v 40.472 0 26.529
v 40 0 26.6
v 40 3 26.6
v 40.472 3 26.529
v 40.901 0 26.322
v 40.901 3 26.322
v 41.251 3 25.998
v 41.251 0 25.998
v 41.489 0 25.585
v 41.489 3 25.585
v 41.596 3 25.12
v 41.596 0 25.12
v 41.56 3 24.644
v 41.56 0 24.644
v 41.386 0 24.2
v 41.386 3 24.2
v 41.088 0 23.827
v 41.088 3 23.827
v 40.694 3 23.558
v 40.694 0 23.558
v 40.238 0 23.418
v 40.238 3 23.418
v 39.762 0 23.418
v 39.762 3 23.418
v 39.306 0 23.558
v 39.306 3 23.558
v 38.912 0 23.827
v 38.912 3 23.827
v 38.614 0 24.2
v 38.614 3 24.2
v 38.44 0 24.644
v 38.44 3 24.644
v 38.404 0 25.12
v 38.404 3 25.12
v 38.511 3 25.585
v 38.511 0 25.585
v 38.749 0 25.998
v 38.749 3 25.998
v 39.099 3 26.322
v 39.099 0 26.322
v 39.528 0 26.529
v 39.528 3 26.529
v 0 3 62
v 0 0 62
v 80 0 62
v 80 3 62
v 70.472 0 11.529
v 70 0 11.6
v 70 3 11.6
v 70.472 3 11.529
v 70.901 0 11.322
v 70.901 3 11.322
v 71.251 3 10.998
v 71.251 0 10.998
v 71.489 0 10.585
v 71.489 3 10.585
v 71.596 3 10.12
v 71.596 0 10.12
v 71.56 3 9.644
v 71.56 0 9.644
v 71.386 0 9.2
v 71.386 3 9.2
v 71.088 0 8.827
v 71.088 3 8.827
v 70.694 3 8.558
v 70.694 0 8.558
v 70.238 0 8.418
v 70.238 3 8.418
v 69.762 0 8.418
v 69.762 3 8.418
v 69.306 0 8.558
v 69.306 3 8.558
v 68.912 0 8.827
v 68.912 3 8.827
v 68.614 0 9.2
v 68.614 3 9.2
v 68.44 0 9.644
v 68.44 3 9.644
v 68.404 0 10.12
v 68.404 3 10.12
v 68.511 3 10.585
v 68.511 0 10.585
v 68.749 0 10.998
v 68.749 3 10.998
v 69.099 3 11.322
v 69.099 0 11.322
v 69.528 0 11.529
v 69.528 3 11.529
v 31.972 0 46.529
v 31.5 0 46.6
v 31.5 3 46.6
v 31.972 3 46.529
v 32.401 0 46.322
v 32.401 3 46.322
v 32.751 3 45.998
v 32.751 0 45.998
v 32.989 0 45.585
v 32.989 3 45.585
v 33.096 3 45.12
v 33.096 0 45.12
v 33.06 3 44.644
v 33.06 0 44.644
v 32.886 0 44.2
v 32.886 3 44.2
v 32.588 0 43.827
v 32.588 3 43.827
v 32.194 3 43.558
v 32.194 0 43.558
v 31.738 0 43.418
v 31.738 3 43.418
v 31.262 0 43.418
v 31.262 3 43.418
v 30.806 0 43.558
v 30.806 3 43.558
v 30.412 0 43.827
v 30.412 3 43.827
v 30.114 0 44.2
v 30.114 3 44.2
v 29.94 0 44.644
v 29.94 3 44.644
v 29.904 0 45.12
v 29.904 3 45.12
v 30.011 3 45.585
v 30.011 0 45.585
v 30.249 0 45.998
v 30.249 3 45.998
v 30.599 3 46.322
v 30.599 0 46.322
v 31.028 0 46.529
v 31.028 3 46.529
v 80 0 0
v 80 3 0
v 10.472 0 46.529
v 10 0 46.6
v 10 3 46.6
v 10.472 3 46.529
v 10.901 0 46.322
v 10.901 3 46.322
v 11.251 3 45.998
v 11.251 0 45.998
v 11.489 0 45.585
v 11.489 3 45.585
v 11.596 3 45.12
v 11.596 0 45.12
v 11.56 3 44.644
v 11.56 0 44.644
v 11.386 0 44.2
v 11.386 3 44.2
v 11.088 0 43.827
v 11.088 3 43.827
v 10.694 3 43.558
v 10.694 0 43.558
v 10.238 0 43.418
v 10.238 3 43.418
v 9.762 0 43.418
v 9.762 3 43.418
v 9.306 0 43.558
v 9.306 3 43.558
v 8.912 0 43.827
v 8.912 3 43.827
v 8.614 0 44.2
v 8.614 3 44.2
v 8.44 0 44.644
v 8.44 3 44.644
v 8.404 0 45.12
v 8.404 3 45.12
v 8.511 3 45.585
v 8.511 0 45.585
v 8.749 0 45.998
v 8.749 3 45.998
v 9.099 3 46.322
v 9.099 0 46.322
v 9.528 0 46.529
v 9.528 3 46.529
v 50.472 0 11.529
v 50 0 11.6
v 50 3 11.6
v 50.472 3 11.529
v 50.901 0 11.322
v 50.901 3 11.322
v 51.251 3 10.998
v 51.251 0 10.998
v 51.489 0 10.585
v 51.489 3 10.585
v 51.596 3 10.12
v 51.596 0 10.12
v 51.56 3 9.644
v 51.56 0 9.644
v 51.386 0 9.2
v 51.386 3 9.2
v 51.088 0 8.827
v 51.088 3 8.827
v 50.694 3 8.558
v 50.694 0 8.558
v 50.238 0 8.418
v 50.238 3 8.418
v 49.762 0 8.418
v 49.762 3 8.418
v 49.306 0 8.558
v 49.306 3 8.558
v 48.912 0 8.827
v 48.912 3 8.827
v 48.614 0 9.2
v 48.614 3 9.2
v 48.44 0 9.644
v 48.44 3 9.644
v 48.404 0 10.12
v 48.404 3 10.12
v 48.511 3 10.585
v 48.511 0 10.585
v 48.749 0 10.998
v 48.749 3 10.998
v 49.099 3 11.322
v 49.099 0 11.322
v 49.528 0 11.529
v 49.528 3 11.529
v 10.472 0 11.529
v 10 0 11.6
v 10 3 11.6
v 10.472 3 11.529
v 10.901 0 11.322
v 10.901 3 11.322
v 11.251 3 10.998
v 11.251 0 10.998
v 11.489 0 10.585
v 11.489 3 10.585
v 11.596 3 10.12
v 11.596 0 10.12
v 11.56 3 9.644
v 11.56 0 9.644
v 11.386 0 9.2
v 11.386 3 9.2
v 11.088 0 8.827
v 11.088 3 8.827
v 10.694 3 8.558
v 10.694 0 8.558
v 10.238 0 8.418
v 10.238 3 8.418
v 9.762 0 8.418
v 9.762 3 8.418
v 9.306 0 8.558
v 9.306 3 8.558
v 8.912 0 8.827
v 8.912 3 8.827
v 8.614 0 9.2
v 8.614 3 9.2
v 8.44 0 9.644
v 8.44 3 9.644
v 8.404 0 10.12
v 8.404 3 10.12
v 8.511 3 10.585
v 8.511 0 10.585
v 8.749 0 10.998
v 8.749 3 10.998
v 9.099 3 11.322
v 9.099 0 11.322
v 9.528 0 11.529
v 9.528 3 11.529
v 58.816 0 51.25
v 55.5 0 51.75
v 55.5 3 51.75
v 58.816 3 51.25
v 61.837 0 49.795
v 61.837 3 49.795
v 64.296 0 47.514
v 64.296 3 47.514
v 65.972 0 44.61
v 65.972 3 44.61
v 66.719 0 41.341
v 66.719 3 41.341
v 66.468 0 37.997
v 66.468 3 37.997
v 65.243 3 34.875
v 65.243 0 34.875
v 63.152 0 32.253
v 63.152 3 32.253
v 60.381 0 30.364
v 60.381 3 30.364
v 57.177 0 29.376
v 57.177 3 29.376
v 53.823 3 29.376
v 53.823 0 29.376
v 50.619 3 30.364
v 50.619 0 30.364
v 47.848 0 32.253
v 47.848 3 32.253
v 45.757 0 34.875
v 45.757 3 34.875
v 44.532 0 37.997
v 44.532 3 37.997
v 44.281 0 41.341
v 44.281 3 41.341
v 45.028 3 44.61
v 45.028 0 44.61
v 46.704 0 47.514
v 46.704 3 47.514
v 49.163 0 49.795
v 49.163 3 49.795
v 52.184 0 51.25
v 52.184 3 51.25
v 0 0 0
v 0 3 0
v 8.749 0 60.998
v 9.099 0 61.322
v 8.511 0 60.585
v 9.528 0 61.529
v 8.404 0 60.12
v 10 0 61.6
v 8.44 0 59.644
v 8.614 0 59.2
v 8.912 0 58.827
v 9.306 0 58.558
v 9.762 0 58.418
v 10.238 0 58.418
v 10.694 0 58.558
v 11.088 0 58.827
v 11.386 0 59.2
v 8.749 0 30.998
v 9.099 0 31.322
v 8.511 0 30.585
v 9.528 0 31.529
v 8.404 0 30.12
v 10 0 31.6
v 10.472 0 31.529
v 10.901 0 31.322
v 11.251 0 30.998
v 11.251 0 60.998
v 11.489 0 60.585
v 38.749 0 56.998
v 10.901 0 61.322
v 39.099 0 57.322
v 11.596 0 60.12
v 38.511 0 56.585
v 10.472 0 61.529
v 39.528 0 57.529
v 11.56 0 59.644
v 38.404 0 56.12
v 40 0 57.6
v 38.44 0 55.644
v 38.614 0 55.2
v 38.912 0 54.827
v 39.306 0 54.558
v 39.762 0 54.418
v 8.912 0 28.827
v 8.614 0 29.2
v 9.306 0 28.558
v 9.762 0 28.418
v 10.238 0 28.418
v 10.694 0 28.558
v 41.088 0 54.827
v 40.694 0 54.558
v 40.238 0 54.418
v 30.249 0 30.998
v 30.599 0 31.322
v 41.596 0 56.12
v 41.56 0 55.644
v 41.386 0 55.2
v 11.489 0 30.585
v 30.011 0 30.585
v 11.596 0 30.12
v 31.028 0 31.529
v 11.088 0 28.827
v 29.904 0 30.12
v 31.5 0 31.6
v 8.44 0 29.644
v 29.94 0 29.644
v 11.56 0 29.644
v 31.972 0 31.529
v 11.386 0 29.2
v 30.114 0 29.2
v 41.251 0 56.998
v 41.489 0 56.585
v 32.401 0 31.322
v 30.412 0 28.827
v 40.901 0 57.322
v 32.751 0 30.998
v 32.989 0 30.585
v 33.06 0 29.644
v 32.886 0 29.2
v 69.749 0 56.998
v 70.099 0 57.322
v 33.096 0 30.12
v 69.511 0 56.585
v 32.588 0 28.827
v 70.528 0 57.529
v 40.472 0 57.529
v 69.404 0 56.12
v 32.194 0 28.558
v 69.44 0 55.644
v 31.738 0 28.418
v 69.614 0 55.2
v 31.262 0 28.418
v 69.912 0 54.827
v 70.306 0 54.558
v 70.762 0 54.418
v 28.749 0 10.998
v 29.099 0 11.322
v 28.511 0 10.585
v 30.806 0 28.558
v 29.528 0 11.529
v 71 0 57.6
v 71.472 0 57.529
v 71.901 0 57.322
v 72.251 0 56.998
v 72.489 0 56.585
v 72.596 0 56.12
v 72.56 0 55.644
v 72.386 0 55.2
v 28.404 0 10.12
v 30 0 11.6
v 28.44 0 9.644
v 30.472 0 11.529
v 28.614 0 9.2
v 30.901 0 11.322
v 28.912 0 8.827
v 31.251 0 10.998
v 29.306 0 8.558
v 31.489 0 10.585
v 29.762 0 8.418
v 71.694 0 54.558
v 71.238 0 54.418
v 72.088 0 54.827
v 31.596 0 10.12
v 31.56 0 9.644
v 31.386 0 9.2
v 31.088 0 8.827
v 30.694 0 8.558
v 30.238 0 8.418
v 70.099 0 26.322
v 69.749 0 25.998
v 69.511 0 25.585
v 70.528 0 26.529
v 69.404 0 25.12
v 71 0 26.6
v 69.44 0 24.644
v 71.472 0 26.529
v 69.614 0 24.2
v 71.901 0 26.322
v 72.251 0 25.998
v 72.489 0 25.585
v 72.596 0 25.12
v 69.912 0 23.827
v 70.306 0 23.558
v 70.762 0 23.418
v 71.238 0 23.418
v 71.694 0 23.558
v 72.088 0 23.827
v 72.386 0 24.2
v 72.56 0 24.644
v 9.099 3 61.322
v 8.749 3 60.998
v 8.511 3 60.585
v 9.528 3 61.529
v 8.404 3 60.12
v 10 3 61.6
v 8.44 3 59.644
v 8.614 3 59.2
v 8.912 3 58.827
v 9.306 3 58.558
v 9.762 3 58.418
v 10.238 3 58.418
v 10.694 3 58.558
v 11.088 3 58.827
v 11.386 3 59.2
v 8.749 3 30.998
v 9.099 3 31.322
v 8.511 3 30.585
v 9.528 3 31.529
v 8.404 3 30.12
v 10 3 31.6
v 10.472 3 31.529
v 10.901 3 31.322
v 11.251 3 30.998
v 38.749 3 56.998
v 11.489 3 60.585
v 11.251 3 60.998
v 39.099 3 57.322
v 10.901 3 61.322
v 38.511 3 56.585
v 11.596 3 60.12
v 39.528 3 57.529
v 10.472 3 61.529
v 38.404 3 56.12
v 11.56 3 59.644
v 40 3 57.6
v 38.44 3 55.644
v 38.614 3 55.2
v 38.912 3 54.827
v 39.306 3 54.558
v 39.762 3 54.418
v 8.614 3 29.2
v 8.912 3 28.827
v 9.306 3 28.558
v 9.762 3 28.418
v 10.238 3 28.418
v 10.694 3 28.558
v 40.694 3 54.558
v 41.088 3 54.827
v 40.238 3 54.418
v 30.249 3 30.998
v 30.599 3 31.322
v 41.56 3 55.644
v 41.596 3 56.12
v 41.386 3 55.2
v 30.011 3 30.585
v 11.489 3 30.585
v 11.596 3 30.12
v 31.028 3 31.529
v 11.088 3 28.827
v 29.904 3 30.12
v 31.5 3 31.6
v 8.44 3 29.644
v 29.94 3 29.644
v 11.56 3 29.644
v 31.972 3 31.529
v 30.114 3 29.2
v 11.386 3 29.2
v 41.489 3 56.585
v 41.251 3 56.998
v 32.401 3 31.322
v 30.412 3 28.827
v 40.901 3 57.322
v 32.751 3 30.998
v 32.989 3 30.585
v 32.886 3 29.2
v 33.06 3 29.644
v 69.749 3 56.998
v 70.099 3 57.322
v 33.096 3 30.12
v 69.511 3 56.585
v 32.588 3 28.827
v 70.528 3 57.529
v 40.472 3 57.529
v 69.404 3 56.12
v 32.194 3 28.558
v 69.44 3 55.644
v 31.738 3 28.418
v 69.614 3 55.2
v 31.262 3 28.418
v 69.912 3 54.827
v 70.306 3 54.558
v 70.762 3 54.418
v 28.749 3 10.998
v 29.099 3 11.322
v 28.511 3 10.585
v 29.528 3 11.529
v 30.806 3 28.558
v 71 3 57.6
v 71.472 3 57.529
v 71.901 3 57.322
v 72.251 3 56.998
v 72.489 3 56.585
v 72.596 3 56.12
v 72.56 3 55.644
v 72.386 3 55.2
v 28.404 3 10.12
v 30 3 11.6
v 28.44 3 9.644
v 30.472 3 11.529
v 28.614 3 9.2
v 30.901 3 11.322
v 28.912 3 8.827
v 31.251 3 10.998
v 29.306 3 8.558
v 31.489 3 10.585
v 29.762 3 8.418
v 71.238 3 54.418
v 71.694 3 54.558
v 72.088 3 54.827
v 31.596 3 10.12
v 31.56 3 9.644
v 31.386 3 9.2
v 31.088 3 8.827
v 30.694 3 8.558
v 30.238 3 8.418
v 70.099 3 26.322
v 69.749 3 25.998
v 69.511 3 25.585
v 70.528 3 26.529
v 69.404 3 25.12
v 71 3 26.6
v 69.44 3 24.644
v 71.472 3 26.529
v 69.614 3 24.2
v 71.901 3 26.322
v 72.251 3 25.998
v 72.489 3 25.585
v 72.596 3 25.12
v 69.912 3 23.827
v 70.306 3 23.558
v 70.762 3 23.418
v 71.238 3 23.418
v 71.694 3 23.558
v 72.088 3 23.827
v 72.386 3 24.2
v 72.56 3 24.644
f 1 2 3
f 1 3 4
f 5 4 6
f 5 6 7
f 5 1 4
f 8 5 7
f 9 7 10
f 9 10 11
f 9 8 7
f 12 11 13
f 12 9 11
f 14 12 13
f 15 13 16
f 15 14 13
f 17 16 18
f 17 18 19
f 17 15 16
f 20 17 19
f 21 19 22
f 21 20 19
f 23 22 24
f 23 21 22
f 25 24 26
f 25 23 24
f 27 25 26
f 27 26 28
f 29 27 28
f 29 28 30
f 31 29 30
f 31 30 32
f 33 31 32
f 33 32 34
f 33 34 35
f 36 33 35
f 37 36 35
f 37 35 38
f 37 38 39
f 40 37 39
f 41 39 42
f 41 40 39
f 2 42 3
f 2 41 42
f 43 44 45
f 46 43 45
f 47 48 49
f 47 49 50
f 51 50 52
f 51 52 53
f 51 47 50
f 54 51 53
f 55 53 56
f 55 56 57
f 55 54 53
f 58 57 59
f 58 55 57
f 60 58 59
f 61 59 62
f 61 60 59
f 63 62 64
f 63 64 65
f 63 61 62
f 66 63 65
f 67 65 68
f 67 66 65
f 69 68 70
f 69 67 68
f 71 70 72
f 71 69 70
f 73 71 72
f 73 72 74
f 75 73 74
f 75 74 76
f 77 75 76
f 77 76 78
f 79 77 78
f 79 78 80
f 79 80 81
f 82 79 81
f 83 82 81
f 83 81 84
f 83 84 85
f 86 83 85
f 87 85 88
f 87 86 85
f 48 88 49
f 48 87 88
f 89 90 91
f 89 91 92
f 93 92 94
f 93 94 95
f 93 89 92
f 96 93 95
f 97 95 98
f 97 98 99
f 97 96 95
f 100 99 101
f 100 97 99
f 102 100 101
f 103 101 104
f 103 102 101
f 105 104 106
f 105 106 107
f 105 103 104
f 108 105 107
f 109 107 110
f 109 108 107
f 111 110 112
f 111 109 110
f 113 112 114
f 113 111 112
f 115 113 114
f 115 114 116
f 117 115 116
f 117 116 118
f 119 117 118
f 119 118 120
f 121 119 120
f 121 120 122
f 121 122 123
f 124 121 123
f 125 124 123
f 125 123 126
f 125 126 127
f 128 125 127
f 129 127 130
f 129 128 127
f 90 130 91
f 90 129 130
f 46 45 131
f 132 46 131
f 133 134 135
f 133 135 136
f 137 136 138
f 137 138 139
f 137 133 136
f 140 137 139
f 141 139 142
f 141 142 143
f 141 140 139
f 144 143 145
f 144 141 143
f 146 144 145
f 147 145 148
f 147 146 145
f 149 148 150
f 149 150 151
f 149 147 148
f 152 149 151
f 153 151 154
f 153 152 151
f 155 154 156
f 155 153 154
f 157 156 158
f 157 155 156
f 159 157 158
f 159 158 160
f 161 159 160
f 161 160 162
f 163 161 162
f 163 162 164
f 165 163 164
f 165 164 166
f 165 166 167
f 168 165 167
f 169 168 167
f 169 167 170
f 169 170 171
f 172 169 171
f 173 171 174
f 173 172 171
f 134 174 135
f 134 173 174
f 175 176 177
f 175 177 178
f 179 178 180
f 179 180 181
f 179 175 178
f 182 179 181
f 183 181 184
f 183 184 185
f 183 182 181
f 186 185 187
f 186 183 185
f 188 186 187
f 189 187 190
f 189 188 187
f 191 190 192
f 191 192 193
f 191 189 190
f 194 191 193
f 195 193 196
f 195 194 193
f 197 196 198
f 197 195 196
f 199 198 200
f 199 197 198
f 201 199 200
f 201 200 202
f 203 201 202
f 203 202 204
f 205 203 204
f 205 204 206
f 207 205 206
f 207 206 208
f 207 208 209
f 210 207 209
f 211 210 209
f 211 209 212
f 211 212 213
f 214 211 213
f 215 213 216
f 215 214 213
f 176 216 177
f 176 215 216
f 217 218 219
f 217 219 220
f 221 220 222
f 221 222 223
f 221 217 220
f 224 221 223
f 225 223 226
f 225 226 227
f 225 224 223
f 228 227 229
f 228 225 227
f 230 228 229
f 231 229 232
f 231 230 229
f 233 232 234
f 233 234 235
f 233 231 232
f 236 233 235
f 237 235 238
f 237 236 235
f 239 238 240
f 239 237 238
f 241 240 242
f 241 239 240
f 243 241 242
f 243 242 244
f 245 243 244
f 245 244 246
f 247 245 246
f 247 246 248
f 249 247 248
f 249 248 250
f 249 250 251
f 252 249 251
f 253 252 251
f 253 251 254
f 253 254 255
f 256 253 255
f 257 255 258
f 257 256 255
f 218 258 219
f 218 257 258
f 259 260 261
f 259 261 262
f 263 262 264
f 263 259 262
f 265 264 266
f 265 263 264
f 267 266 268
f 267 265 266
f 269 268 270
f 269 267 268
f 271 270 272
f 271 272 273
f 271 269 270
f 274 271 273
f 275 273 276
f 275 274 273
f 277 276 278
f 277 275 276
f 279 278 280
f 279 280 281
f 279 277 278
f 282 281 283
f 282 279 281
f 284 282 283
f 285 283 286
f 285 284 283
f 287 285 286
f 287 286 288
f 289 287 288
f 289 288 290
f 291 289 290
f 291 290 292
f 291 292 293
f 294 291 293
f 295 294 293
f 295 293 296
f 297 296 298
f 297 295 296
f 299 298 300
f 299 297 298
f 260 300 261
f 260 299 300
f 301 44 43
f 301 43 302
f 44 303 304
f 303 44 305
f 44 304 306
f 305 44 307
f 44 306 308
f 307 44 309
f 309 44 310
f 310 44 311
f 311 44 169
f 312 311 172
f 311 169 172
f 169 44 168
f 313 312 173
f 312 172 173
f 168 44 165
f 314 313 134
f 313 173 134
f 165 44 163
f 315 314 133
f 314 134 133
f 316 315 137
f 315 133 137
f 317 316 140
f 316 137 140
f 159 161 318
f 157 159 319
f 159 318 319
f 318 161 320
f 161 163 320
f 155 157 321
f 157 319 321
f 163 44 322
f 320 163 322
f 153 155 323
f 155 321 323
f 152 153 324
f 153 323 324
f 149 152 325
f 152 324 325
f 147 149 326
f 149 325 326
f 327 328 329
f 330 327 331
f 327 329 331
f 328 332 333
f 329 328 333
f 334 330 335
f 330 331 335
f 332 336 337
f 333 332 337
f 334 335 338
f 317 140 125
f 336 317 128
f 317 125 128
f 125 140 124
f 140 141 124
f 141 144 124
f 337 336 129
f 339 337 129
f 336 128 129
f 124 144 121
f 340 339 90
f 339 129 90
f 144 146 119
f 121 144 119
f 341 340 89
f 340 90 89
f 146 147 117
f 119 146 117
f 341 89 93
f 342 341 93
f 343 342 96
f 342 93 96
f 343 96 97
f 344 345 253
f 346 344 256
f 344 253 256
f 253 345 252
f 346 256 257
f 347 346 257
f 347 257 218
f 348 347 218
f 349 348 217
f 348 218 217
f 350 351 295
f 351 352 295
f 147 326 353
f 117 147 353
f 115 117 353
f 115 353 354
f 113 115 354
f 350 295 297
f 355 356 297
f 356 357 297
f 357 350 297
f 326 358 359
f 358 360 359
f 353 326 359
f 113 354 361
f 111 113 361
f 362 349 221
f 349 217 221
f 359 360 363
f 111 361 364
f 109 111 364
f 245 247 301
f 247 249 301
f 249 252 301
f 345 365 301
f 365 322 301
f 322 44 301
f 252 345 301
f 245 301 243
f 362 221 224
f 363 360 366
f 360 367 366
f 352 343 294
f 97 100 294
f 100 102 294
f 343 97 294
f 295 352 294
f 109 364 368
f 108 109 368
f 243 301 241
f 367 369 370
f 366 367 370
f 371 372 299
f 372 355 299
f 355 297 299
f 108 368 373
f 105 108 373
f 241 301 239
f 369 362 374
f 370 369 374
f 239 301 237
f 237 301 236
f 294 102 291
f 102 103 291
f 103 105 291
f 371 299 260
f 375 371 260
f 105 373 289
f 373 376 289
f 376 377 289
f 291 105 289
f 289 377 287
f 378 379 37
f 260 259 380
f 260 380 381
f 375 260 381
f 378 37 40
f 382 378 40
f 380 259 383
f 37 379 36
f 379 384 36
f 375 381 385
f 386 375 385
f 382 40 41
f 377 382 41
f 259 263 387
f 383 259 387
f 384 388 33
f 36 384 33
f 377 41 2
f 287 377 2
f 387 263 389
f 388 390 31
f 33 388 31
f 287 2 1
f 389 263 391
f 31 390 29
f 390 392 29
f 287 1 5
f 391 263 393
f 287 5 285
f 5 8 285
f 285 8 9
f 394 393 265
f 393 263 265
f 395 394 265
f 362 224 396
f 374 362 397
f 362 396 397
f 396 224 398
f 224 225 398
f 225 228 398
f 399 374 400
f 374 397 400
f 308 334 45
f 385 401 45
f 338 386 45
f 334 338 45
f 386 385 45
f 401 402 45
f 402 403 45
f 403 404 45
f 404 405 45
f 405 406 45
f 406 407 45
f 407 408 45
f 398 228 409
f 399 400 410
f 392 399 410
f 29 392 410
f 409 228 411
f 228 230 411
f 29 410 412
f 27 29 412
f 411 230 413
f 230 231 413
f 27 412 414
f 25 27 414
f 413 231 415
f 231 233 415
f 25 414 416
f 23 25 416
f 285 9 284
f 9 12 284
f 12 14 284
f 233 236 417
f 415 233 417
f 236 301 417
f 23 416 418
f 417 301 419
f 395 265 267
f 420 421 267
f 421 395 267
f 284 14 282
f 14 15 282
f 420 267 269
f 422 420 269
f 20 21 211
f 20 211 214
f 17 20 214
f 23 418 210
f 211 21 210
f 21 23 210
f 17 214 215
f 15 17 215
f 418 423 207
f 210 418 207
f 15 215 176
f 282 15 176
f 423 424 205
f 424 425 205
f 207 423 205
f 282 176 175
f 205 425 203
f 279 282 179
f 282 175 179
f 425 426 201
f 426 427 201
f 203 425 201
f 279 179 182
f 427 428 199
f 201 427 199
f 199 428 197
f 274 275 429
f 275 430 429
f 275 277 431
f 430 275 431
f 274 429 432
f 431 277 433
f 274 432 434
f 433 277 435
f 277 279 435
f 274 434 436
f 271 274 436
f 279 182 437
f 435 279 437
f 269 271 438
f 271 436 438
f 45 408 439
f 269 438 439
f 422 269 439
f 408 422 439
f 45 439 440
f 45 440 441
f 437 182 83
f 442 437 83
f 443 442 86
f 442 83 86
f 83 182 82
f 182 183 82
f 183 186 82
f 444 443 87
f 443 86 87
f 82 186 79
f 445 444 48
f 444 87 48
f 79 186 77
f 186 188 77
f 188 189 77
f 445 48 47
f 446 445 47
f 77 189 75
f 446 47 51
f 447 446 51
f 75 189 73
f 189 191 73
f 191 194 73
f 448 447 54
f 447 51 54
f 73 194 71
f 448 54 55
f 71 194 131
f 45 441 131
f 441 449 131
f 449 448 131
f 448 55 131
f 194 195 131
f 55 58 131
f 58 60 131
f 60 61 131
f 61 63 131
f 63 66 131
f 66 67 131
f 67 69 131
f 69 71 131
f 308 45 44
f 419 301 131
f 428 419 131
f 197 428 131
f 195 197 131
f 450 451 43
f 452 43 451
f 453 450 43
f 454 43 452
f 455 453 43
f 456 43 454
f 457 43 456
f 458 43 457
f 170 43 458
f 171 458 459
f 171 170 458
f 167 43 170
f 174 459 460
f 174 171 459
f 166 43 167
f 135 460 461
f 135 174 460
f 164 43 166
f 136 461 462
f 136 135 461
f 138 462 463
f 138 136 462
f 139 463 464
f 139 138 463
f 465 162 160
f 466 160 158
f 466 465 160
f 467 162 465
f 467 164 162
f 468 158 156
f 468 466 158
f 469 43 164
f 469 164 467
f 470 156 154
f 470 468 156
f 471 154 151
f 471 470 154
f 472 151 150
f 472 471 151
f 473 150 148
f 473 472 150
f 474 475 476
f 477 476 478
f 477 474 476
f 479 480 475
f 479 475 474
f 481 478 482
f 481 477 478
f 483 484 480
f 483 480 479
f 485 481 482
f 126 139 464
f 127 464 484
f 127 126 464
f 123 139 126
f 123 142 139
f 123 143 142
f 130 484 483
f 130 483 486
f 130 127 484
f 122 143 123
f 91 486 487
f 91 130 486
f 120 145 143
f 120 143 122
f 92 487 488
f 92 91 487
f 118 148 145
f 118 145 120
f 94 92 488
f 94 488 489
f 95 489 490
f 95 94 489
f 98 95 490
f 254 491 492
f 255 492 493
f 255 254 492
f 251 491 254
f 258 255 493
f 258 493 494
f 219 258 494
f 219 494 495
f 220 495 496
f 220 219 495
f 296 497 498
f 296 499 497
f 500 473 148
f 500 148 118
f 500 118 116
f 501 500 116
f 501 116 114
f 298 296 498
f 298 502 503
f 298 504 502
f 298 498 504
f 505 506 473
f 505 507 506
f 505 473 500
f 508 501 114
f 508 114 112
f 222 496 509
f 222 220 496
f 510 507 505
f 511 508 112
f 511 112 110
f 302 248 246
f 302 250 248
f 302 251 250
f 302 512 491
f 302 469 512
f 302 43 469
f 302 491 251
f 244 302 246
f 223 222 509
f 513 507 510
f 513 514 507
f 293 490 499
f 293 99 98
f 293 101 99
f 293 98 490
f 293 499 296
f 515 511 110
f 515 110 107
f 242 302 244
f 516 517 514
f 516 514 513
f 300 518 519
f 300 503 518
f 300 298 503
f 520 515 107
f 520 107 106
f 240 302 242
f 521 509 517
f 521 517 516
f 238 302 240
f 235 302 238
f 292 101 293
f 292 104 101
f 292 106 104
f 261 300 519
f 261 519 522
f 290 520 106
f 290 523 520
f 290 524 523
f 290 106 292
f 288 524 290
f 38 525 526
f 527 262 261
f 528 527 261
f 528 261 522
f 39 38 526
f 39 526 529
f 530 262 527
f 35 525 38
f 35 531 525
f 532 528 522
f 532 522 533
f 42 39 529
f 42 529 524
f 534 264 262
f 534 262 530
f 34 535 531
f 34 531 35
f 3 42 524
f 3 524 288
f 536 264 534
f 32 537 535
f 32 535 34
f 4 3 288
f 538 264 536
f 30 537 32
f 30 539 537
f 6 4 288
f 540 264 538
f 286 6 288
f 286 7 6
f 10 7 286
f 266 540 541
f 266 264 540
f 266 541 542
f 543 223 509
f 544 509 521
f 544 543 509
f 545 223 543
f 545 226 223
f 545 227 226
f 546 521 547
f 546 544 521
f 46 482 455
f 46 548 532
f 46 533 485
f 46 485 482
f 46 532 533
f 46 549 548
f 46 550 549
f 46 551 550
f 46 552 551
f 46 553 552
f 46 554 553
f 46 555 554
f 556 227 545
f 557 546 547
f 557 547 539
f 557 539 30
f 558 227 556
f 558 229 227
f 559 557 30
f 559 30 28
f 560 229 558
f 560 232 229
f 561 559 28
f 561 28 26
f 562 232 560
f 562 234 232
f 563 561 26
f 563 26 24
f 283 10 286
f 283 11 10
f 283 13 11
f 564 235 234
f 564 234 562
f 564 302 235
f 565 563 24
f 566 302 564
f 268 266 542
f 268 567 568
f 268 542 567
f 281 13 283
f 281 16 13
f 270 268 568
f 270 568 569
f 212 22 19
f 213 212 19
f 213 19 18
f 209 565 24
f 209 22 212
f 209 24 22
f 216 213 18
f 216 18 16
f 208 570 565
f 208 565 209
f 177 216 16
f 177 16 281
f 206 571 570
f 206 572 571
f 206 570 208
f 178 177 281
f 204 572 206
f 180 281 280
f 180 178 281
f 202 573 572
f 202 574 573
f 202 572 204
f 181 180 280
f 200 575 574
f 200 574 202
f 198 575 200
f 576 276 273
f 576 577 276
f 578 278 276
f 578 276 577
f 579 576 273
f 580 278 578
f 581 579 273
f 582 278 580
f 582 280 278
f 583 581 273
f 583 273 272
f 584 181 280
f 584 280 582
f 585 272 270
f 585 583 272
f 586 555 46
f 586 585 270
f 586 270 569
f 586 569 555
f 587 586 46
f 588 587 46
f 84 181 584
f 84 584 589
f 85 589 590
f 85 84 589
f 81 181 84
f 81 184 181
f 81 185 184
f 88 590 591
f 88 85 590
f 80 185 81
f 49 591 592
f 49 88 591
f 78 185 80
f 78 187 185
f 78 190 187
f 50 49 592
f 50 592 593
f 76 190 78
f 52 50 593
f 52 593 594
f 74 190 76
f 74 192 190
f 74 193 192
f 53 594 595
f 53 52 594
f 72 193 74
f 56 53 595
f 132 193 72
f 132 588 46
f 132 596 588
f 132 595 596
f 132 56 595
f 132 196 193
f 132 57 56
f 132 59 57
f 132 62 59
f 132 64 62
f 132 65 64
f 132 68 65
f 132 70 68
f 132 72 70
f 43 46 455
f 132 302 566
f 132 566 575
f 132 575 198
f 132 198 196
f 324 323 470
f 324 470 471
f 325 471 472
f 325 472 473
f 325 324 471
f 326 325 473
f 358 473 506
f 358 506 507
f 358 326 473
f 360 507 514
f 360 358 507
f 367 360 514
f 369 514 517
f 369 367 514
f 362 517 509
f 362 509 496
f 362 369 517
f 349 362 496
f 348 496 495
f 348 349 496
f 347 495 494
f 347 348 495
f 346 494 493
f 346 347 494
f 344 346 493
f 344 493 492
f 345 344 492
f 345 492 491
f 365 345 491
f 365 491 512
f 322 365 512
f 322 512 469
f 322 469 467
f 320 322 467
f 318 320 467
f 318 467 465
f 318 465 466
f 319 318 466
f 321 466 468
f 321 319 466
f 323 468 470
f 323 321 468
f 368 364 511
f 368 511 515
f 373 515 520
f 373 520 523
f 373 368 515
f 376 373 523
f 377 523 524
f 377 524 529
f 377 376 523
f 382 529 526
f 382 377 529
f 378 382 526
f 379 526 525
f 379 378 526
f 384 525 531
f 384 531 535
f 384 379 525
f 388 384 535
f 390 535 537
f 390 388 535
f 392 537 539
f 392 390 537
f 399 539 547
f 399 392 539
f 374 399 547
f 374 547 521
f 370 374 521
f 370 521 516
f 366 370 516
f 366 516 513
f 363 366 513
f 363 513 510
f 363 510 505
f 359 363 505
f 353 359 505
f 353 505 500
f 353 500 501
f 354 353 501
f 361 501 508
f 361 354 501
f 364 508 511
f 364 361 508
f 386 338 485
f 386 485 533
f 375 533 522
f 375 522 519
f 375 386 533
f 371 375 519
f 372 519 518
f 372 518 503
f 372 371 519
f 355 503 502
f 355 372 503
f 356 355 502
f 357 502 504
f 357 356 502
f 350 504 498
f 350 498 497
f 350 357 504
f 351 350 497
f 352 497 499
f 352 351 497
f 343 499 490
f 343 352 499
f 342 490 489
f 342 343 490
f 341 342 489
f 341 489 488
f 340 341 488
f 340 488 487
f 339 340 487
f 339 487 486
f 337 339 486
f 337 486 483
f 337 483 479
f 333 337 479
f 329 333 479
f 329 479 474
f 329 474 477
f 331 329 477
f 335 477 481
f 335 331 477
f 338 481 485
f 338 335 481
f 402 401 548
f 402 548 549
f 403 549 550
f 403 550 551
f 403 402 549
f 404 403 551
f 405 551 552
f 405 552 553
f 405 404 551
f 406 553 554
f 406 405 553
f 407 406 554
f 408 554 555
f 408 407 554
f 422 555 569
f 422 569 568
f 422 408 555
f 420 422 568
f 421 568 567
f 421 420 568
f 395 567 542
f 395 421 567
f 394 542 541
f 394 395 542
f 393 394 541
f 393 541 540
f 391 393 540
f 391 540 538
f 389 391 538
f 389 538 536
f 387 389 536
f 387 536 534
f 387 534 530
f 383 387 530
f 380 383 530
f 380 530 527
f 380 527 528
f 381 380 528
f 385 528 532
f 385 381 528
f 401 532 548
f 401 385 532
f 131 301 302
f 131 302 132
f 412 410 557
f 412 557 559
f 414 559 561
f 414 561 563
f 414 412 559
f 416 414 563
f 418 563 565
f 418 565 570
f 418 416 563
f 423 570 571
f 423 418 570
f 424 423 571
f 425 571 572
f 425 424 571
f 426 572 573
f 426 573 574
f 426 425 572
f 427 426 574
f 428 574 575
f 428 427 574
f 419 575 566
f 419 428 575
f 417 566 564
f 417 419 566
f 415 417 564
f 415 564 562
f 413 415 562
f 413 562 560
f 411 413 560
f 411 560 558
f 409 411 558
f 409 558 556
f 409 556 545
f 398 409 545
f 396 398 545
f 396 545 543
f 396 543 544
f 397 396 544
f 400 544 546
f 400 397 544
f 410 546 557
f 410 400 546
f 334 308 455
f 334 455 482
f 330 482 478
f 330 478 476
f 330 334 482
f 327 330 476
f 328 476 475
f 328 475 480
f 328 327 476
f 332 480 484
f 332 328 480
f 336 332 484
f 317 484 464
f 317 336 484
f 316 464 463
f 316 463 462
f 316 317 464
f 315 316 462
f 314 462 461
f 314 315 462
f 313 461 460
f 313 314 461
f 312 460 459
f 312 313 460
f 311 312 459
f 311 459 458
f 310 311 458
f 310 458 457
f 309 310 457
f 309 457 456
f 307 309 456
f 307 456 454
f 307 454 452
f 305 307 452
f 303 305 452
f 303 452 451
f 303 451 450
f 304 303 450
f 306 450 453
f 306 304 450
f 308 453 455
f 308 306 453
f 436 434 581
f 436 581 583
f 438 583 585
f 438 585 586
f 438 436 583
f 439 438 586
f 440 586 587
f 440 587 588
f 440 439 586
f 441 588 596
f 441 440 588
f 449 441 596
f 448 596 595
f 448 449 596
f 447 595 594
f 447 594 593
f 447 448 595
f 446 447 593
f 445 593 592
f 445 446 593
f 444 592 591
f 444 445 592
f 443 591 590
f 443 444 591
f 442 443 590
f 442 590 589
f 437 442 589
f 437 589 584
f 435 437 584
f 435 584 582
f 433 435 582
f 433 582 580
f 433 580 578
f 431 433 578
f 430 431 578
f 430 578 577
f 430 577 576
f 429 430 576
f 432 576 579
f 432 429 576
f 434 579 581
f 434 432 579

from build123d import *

# Parameters (mm, degrees)
SKETCH_1_W      = 80
SKETCH_1_H      = 62
SKETCH_1_R      = 1.6
SKETCH_1_R_2    = 11.25
EXTRUDE_1_DEPTH = 3


with BuildPart() as part:
    # 草图1 → 凸台-拉伸1 (new body)
    with BuildSketch(Plane(origin=(0, 0, 0), x_dir=(1, 0, 0), z_dir=(0, 1, 0))):
        with Locations((40, -31)):
            Rectangle(SKETCH_1_W, SKETCH_1_H)
        with Locations(Location((10, -10, 0), (0, 0, 270))):
            Circle(SKETCH_1_R, mode=Mode.SUBTRACT)
        with Locations(Location((10, -30, 0), (0, 0, 270))):
            Circle(SKETCH_1_R, mode=Mode.SUBTRACT)
        with Locations(Location((10, -45, 0), (0, 0, 270))):
            Circle(SKETCH_1_R, mode=Mode.SUBTRACT)
        with Locations(Location((10, -60, 0), (0, 0, 270))):
            Circle(SKETCH_1_R, mode=Mode.SUBTRACT)
        with Locations(Location((30, -10, 0), (0, 0, 270))):
            Circle(SKETCH_1_R, mode=Mode.SUBTRACT)
        with Locations(Location((71, -25, 0), (0, 0, 270))):
            Circle(SKETCH_1_R, mode=Mode.SUBTRACT)
        with Locations(Location((40, -25, 0), (0, 0, 270))):
            Circle(SKETCH_1_R, mode=Mode.SUBTRACT)
        with Locations(Location((40, -56, 0), (0, 0, 270))):
            Circle(SKETCH_1_R, mode=Mode.SUBTRACT)
        with Locations(Location((71, -56, 0), (0, 0, 270))):
            Circle(SKETCH_1_R, mode=Mode.SUBTRACT)
        with Locations(Location((55.5, -40.5, 0), (0, 0, 270))):
            Circle(SKETCH_1_R_2, mode=Mode.SUBTRACT)
        with Locations(Location((50, -10, 0), (0, 0, 270))):
            Circle(SKETCH_1_R, mode=Mode.SUBTRACT)
        with Locations(Location((70, -10, 0), (0, 0, 270))):
            Circle(SKETCH_1_R, mode=Mode.SUBTRACT)
        with Locations(Location((31.5, -30, 0), (0, 0, 270))):
            Circle(SKETCH_1_R, mode=Mode.SUBTRACT)
        with Locations(Location((31.5, -45, 0), (0, 0, 270))):
            Circle(SKETCH_1_R, mode=Mode.SUBTRACT)
    extrude(amount=EXTRUDE_1_DEPTH)


solid = part.part
